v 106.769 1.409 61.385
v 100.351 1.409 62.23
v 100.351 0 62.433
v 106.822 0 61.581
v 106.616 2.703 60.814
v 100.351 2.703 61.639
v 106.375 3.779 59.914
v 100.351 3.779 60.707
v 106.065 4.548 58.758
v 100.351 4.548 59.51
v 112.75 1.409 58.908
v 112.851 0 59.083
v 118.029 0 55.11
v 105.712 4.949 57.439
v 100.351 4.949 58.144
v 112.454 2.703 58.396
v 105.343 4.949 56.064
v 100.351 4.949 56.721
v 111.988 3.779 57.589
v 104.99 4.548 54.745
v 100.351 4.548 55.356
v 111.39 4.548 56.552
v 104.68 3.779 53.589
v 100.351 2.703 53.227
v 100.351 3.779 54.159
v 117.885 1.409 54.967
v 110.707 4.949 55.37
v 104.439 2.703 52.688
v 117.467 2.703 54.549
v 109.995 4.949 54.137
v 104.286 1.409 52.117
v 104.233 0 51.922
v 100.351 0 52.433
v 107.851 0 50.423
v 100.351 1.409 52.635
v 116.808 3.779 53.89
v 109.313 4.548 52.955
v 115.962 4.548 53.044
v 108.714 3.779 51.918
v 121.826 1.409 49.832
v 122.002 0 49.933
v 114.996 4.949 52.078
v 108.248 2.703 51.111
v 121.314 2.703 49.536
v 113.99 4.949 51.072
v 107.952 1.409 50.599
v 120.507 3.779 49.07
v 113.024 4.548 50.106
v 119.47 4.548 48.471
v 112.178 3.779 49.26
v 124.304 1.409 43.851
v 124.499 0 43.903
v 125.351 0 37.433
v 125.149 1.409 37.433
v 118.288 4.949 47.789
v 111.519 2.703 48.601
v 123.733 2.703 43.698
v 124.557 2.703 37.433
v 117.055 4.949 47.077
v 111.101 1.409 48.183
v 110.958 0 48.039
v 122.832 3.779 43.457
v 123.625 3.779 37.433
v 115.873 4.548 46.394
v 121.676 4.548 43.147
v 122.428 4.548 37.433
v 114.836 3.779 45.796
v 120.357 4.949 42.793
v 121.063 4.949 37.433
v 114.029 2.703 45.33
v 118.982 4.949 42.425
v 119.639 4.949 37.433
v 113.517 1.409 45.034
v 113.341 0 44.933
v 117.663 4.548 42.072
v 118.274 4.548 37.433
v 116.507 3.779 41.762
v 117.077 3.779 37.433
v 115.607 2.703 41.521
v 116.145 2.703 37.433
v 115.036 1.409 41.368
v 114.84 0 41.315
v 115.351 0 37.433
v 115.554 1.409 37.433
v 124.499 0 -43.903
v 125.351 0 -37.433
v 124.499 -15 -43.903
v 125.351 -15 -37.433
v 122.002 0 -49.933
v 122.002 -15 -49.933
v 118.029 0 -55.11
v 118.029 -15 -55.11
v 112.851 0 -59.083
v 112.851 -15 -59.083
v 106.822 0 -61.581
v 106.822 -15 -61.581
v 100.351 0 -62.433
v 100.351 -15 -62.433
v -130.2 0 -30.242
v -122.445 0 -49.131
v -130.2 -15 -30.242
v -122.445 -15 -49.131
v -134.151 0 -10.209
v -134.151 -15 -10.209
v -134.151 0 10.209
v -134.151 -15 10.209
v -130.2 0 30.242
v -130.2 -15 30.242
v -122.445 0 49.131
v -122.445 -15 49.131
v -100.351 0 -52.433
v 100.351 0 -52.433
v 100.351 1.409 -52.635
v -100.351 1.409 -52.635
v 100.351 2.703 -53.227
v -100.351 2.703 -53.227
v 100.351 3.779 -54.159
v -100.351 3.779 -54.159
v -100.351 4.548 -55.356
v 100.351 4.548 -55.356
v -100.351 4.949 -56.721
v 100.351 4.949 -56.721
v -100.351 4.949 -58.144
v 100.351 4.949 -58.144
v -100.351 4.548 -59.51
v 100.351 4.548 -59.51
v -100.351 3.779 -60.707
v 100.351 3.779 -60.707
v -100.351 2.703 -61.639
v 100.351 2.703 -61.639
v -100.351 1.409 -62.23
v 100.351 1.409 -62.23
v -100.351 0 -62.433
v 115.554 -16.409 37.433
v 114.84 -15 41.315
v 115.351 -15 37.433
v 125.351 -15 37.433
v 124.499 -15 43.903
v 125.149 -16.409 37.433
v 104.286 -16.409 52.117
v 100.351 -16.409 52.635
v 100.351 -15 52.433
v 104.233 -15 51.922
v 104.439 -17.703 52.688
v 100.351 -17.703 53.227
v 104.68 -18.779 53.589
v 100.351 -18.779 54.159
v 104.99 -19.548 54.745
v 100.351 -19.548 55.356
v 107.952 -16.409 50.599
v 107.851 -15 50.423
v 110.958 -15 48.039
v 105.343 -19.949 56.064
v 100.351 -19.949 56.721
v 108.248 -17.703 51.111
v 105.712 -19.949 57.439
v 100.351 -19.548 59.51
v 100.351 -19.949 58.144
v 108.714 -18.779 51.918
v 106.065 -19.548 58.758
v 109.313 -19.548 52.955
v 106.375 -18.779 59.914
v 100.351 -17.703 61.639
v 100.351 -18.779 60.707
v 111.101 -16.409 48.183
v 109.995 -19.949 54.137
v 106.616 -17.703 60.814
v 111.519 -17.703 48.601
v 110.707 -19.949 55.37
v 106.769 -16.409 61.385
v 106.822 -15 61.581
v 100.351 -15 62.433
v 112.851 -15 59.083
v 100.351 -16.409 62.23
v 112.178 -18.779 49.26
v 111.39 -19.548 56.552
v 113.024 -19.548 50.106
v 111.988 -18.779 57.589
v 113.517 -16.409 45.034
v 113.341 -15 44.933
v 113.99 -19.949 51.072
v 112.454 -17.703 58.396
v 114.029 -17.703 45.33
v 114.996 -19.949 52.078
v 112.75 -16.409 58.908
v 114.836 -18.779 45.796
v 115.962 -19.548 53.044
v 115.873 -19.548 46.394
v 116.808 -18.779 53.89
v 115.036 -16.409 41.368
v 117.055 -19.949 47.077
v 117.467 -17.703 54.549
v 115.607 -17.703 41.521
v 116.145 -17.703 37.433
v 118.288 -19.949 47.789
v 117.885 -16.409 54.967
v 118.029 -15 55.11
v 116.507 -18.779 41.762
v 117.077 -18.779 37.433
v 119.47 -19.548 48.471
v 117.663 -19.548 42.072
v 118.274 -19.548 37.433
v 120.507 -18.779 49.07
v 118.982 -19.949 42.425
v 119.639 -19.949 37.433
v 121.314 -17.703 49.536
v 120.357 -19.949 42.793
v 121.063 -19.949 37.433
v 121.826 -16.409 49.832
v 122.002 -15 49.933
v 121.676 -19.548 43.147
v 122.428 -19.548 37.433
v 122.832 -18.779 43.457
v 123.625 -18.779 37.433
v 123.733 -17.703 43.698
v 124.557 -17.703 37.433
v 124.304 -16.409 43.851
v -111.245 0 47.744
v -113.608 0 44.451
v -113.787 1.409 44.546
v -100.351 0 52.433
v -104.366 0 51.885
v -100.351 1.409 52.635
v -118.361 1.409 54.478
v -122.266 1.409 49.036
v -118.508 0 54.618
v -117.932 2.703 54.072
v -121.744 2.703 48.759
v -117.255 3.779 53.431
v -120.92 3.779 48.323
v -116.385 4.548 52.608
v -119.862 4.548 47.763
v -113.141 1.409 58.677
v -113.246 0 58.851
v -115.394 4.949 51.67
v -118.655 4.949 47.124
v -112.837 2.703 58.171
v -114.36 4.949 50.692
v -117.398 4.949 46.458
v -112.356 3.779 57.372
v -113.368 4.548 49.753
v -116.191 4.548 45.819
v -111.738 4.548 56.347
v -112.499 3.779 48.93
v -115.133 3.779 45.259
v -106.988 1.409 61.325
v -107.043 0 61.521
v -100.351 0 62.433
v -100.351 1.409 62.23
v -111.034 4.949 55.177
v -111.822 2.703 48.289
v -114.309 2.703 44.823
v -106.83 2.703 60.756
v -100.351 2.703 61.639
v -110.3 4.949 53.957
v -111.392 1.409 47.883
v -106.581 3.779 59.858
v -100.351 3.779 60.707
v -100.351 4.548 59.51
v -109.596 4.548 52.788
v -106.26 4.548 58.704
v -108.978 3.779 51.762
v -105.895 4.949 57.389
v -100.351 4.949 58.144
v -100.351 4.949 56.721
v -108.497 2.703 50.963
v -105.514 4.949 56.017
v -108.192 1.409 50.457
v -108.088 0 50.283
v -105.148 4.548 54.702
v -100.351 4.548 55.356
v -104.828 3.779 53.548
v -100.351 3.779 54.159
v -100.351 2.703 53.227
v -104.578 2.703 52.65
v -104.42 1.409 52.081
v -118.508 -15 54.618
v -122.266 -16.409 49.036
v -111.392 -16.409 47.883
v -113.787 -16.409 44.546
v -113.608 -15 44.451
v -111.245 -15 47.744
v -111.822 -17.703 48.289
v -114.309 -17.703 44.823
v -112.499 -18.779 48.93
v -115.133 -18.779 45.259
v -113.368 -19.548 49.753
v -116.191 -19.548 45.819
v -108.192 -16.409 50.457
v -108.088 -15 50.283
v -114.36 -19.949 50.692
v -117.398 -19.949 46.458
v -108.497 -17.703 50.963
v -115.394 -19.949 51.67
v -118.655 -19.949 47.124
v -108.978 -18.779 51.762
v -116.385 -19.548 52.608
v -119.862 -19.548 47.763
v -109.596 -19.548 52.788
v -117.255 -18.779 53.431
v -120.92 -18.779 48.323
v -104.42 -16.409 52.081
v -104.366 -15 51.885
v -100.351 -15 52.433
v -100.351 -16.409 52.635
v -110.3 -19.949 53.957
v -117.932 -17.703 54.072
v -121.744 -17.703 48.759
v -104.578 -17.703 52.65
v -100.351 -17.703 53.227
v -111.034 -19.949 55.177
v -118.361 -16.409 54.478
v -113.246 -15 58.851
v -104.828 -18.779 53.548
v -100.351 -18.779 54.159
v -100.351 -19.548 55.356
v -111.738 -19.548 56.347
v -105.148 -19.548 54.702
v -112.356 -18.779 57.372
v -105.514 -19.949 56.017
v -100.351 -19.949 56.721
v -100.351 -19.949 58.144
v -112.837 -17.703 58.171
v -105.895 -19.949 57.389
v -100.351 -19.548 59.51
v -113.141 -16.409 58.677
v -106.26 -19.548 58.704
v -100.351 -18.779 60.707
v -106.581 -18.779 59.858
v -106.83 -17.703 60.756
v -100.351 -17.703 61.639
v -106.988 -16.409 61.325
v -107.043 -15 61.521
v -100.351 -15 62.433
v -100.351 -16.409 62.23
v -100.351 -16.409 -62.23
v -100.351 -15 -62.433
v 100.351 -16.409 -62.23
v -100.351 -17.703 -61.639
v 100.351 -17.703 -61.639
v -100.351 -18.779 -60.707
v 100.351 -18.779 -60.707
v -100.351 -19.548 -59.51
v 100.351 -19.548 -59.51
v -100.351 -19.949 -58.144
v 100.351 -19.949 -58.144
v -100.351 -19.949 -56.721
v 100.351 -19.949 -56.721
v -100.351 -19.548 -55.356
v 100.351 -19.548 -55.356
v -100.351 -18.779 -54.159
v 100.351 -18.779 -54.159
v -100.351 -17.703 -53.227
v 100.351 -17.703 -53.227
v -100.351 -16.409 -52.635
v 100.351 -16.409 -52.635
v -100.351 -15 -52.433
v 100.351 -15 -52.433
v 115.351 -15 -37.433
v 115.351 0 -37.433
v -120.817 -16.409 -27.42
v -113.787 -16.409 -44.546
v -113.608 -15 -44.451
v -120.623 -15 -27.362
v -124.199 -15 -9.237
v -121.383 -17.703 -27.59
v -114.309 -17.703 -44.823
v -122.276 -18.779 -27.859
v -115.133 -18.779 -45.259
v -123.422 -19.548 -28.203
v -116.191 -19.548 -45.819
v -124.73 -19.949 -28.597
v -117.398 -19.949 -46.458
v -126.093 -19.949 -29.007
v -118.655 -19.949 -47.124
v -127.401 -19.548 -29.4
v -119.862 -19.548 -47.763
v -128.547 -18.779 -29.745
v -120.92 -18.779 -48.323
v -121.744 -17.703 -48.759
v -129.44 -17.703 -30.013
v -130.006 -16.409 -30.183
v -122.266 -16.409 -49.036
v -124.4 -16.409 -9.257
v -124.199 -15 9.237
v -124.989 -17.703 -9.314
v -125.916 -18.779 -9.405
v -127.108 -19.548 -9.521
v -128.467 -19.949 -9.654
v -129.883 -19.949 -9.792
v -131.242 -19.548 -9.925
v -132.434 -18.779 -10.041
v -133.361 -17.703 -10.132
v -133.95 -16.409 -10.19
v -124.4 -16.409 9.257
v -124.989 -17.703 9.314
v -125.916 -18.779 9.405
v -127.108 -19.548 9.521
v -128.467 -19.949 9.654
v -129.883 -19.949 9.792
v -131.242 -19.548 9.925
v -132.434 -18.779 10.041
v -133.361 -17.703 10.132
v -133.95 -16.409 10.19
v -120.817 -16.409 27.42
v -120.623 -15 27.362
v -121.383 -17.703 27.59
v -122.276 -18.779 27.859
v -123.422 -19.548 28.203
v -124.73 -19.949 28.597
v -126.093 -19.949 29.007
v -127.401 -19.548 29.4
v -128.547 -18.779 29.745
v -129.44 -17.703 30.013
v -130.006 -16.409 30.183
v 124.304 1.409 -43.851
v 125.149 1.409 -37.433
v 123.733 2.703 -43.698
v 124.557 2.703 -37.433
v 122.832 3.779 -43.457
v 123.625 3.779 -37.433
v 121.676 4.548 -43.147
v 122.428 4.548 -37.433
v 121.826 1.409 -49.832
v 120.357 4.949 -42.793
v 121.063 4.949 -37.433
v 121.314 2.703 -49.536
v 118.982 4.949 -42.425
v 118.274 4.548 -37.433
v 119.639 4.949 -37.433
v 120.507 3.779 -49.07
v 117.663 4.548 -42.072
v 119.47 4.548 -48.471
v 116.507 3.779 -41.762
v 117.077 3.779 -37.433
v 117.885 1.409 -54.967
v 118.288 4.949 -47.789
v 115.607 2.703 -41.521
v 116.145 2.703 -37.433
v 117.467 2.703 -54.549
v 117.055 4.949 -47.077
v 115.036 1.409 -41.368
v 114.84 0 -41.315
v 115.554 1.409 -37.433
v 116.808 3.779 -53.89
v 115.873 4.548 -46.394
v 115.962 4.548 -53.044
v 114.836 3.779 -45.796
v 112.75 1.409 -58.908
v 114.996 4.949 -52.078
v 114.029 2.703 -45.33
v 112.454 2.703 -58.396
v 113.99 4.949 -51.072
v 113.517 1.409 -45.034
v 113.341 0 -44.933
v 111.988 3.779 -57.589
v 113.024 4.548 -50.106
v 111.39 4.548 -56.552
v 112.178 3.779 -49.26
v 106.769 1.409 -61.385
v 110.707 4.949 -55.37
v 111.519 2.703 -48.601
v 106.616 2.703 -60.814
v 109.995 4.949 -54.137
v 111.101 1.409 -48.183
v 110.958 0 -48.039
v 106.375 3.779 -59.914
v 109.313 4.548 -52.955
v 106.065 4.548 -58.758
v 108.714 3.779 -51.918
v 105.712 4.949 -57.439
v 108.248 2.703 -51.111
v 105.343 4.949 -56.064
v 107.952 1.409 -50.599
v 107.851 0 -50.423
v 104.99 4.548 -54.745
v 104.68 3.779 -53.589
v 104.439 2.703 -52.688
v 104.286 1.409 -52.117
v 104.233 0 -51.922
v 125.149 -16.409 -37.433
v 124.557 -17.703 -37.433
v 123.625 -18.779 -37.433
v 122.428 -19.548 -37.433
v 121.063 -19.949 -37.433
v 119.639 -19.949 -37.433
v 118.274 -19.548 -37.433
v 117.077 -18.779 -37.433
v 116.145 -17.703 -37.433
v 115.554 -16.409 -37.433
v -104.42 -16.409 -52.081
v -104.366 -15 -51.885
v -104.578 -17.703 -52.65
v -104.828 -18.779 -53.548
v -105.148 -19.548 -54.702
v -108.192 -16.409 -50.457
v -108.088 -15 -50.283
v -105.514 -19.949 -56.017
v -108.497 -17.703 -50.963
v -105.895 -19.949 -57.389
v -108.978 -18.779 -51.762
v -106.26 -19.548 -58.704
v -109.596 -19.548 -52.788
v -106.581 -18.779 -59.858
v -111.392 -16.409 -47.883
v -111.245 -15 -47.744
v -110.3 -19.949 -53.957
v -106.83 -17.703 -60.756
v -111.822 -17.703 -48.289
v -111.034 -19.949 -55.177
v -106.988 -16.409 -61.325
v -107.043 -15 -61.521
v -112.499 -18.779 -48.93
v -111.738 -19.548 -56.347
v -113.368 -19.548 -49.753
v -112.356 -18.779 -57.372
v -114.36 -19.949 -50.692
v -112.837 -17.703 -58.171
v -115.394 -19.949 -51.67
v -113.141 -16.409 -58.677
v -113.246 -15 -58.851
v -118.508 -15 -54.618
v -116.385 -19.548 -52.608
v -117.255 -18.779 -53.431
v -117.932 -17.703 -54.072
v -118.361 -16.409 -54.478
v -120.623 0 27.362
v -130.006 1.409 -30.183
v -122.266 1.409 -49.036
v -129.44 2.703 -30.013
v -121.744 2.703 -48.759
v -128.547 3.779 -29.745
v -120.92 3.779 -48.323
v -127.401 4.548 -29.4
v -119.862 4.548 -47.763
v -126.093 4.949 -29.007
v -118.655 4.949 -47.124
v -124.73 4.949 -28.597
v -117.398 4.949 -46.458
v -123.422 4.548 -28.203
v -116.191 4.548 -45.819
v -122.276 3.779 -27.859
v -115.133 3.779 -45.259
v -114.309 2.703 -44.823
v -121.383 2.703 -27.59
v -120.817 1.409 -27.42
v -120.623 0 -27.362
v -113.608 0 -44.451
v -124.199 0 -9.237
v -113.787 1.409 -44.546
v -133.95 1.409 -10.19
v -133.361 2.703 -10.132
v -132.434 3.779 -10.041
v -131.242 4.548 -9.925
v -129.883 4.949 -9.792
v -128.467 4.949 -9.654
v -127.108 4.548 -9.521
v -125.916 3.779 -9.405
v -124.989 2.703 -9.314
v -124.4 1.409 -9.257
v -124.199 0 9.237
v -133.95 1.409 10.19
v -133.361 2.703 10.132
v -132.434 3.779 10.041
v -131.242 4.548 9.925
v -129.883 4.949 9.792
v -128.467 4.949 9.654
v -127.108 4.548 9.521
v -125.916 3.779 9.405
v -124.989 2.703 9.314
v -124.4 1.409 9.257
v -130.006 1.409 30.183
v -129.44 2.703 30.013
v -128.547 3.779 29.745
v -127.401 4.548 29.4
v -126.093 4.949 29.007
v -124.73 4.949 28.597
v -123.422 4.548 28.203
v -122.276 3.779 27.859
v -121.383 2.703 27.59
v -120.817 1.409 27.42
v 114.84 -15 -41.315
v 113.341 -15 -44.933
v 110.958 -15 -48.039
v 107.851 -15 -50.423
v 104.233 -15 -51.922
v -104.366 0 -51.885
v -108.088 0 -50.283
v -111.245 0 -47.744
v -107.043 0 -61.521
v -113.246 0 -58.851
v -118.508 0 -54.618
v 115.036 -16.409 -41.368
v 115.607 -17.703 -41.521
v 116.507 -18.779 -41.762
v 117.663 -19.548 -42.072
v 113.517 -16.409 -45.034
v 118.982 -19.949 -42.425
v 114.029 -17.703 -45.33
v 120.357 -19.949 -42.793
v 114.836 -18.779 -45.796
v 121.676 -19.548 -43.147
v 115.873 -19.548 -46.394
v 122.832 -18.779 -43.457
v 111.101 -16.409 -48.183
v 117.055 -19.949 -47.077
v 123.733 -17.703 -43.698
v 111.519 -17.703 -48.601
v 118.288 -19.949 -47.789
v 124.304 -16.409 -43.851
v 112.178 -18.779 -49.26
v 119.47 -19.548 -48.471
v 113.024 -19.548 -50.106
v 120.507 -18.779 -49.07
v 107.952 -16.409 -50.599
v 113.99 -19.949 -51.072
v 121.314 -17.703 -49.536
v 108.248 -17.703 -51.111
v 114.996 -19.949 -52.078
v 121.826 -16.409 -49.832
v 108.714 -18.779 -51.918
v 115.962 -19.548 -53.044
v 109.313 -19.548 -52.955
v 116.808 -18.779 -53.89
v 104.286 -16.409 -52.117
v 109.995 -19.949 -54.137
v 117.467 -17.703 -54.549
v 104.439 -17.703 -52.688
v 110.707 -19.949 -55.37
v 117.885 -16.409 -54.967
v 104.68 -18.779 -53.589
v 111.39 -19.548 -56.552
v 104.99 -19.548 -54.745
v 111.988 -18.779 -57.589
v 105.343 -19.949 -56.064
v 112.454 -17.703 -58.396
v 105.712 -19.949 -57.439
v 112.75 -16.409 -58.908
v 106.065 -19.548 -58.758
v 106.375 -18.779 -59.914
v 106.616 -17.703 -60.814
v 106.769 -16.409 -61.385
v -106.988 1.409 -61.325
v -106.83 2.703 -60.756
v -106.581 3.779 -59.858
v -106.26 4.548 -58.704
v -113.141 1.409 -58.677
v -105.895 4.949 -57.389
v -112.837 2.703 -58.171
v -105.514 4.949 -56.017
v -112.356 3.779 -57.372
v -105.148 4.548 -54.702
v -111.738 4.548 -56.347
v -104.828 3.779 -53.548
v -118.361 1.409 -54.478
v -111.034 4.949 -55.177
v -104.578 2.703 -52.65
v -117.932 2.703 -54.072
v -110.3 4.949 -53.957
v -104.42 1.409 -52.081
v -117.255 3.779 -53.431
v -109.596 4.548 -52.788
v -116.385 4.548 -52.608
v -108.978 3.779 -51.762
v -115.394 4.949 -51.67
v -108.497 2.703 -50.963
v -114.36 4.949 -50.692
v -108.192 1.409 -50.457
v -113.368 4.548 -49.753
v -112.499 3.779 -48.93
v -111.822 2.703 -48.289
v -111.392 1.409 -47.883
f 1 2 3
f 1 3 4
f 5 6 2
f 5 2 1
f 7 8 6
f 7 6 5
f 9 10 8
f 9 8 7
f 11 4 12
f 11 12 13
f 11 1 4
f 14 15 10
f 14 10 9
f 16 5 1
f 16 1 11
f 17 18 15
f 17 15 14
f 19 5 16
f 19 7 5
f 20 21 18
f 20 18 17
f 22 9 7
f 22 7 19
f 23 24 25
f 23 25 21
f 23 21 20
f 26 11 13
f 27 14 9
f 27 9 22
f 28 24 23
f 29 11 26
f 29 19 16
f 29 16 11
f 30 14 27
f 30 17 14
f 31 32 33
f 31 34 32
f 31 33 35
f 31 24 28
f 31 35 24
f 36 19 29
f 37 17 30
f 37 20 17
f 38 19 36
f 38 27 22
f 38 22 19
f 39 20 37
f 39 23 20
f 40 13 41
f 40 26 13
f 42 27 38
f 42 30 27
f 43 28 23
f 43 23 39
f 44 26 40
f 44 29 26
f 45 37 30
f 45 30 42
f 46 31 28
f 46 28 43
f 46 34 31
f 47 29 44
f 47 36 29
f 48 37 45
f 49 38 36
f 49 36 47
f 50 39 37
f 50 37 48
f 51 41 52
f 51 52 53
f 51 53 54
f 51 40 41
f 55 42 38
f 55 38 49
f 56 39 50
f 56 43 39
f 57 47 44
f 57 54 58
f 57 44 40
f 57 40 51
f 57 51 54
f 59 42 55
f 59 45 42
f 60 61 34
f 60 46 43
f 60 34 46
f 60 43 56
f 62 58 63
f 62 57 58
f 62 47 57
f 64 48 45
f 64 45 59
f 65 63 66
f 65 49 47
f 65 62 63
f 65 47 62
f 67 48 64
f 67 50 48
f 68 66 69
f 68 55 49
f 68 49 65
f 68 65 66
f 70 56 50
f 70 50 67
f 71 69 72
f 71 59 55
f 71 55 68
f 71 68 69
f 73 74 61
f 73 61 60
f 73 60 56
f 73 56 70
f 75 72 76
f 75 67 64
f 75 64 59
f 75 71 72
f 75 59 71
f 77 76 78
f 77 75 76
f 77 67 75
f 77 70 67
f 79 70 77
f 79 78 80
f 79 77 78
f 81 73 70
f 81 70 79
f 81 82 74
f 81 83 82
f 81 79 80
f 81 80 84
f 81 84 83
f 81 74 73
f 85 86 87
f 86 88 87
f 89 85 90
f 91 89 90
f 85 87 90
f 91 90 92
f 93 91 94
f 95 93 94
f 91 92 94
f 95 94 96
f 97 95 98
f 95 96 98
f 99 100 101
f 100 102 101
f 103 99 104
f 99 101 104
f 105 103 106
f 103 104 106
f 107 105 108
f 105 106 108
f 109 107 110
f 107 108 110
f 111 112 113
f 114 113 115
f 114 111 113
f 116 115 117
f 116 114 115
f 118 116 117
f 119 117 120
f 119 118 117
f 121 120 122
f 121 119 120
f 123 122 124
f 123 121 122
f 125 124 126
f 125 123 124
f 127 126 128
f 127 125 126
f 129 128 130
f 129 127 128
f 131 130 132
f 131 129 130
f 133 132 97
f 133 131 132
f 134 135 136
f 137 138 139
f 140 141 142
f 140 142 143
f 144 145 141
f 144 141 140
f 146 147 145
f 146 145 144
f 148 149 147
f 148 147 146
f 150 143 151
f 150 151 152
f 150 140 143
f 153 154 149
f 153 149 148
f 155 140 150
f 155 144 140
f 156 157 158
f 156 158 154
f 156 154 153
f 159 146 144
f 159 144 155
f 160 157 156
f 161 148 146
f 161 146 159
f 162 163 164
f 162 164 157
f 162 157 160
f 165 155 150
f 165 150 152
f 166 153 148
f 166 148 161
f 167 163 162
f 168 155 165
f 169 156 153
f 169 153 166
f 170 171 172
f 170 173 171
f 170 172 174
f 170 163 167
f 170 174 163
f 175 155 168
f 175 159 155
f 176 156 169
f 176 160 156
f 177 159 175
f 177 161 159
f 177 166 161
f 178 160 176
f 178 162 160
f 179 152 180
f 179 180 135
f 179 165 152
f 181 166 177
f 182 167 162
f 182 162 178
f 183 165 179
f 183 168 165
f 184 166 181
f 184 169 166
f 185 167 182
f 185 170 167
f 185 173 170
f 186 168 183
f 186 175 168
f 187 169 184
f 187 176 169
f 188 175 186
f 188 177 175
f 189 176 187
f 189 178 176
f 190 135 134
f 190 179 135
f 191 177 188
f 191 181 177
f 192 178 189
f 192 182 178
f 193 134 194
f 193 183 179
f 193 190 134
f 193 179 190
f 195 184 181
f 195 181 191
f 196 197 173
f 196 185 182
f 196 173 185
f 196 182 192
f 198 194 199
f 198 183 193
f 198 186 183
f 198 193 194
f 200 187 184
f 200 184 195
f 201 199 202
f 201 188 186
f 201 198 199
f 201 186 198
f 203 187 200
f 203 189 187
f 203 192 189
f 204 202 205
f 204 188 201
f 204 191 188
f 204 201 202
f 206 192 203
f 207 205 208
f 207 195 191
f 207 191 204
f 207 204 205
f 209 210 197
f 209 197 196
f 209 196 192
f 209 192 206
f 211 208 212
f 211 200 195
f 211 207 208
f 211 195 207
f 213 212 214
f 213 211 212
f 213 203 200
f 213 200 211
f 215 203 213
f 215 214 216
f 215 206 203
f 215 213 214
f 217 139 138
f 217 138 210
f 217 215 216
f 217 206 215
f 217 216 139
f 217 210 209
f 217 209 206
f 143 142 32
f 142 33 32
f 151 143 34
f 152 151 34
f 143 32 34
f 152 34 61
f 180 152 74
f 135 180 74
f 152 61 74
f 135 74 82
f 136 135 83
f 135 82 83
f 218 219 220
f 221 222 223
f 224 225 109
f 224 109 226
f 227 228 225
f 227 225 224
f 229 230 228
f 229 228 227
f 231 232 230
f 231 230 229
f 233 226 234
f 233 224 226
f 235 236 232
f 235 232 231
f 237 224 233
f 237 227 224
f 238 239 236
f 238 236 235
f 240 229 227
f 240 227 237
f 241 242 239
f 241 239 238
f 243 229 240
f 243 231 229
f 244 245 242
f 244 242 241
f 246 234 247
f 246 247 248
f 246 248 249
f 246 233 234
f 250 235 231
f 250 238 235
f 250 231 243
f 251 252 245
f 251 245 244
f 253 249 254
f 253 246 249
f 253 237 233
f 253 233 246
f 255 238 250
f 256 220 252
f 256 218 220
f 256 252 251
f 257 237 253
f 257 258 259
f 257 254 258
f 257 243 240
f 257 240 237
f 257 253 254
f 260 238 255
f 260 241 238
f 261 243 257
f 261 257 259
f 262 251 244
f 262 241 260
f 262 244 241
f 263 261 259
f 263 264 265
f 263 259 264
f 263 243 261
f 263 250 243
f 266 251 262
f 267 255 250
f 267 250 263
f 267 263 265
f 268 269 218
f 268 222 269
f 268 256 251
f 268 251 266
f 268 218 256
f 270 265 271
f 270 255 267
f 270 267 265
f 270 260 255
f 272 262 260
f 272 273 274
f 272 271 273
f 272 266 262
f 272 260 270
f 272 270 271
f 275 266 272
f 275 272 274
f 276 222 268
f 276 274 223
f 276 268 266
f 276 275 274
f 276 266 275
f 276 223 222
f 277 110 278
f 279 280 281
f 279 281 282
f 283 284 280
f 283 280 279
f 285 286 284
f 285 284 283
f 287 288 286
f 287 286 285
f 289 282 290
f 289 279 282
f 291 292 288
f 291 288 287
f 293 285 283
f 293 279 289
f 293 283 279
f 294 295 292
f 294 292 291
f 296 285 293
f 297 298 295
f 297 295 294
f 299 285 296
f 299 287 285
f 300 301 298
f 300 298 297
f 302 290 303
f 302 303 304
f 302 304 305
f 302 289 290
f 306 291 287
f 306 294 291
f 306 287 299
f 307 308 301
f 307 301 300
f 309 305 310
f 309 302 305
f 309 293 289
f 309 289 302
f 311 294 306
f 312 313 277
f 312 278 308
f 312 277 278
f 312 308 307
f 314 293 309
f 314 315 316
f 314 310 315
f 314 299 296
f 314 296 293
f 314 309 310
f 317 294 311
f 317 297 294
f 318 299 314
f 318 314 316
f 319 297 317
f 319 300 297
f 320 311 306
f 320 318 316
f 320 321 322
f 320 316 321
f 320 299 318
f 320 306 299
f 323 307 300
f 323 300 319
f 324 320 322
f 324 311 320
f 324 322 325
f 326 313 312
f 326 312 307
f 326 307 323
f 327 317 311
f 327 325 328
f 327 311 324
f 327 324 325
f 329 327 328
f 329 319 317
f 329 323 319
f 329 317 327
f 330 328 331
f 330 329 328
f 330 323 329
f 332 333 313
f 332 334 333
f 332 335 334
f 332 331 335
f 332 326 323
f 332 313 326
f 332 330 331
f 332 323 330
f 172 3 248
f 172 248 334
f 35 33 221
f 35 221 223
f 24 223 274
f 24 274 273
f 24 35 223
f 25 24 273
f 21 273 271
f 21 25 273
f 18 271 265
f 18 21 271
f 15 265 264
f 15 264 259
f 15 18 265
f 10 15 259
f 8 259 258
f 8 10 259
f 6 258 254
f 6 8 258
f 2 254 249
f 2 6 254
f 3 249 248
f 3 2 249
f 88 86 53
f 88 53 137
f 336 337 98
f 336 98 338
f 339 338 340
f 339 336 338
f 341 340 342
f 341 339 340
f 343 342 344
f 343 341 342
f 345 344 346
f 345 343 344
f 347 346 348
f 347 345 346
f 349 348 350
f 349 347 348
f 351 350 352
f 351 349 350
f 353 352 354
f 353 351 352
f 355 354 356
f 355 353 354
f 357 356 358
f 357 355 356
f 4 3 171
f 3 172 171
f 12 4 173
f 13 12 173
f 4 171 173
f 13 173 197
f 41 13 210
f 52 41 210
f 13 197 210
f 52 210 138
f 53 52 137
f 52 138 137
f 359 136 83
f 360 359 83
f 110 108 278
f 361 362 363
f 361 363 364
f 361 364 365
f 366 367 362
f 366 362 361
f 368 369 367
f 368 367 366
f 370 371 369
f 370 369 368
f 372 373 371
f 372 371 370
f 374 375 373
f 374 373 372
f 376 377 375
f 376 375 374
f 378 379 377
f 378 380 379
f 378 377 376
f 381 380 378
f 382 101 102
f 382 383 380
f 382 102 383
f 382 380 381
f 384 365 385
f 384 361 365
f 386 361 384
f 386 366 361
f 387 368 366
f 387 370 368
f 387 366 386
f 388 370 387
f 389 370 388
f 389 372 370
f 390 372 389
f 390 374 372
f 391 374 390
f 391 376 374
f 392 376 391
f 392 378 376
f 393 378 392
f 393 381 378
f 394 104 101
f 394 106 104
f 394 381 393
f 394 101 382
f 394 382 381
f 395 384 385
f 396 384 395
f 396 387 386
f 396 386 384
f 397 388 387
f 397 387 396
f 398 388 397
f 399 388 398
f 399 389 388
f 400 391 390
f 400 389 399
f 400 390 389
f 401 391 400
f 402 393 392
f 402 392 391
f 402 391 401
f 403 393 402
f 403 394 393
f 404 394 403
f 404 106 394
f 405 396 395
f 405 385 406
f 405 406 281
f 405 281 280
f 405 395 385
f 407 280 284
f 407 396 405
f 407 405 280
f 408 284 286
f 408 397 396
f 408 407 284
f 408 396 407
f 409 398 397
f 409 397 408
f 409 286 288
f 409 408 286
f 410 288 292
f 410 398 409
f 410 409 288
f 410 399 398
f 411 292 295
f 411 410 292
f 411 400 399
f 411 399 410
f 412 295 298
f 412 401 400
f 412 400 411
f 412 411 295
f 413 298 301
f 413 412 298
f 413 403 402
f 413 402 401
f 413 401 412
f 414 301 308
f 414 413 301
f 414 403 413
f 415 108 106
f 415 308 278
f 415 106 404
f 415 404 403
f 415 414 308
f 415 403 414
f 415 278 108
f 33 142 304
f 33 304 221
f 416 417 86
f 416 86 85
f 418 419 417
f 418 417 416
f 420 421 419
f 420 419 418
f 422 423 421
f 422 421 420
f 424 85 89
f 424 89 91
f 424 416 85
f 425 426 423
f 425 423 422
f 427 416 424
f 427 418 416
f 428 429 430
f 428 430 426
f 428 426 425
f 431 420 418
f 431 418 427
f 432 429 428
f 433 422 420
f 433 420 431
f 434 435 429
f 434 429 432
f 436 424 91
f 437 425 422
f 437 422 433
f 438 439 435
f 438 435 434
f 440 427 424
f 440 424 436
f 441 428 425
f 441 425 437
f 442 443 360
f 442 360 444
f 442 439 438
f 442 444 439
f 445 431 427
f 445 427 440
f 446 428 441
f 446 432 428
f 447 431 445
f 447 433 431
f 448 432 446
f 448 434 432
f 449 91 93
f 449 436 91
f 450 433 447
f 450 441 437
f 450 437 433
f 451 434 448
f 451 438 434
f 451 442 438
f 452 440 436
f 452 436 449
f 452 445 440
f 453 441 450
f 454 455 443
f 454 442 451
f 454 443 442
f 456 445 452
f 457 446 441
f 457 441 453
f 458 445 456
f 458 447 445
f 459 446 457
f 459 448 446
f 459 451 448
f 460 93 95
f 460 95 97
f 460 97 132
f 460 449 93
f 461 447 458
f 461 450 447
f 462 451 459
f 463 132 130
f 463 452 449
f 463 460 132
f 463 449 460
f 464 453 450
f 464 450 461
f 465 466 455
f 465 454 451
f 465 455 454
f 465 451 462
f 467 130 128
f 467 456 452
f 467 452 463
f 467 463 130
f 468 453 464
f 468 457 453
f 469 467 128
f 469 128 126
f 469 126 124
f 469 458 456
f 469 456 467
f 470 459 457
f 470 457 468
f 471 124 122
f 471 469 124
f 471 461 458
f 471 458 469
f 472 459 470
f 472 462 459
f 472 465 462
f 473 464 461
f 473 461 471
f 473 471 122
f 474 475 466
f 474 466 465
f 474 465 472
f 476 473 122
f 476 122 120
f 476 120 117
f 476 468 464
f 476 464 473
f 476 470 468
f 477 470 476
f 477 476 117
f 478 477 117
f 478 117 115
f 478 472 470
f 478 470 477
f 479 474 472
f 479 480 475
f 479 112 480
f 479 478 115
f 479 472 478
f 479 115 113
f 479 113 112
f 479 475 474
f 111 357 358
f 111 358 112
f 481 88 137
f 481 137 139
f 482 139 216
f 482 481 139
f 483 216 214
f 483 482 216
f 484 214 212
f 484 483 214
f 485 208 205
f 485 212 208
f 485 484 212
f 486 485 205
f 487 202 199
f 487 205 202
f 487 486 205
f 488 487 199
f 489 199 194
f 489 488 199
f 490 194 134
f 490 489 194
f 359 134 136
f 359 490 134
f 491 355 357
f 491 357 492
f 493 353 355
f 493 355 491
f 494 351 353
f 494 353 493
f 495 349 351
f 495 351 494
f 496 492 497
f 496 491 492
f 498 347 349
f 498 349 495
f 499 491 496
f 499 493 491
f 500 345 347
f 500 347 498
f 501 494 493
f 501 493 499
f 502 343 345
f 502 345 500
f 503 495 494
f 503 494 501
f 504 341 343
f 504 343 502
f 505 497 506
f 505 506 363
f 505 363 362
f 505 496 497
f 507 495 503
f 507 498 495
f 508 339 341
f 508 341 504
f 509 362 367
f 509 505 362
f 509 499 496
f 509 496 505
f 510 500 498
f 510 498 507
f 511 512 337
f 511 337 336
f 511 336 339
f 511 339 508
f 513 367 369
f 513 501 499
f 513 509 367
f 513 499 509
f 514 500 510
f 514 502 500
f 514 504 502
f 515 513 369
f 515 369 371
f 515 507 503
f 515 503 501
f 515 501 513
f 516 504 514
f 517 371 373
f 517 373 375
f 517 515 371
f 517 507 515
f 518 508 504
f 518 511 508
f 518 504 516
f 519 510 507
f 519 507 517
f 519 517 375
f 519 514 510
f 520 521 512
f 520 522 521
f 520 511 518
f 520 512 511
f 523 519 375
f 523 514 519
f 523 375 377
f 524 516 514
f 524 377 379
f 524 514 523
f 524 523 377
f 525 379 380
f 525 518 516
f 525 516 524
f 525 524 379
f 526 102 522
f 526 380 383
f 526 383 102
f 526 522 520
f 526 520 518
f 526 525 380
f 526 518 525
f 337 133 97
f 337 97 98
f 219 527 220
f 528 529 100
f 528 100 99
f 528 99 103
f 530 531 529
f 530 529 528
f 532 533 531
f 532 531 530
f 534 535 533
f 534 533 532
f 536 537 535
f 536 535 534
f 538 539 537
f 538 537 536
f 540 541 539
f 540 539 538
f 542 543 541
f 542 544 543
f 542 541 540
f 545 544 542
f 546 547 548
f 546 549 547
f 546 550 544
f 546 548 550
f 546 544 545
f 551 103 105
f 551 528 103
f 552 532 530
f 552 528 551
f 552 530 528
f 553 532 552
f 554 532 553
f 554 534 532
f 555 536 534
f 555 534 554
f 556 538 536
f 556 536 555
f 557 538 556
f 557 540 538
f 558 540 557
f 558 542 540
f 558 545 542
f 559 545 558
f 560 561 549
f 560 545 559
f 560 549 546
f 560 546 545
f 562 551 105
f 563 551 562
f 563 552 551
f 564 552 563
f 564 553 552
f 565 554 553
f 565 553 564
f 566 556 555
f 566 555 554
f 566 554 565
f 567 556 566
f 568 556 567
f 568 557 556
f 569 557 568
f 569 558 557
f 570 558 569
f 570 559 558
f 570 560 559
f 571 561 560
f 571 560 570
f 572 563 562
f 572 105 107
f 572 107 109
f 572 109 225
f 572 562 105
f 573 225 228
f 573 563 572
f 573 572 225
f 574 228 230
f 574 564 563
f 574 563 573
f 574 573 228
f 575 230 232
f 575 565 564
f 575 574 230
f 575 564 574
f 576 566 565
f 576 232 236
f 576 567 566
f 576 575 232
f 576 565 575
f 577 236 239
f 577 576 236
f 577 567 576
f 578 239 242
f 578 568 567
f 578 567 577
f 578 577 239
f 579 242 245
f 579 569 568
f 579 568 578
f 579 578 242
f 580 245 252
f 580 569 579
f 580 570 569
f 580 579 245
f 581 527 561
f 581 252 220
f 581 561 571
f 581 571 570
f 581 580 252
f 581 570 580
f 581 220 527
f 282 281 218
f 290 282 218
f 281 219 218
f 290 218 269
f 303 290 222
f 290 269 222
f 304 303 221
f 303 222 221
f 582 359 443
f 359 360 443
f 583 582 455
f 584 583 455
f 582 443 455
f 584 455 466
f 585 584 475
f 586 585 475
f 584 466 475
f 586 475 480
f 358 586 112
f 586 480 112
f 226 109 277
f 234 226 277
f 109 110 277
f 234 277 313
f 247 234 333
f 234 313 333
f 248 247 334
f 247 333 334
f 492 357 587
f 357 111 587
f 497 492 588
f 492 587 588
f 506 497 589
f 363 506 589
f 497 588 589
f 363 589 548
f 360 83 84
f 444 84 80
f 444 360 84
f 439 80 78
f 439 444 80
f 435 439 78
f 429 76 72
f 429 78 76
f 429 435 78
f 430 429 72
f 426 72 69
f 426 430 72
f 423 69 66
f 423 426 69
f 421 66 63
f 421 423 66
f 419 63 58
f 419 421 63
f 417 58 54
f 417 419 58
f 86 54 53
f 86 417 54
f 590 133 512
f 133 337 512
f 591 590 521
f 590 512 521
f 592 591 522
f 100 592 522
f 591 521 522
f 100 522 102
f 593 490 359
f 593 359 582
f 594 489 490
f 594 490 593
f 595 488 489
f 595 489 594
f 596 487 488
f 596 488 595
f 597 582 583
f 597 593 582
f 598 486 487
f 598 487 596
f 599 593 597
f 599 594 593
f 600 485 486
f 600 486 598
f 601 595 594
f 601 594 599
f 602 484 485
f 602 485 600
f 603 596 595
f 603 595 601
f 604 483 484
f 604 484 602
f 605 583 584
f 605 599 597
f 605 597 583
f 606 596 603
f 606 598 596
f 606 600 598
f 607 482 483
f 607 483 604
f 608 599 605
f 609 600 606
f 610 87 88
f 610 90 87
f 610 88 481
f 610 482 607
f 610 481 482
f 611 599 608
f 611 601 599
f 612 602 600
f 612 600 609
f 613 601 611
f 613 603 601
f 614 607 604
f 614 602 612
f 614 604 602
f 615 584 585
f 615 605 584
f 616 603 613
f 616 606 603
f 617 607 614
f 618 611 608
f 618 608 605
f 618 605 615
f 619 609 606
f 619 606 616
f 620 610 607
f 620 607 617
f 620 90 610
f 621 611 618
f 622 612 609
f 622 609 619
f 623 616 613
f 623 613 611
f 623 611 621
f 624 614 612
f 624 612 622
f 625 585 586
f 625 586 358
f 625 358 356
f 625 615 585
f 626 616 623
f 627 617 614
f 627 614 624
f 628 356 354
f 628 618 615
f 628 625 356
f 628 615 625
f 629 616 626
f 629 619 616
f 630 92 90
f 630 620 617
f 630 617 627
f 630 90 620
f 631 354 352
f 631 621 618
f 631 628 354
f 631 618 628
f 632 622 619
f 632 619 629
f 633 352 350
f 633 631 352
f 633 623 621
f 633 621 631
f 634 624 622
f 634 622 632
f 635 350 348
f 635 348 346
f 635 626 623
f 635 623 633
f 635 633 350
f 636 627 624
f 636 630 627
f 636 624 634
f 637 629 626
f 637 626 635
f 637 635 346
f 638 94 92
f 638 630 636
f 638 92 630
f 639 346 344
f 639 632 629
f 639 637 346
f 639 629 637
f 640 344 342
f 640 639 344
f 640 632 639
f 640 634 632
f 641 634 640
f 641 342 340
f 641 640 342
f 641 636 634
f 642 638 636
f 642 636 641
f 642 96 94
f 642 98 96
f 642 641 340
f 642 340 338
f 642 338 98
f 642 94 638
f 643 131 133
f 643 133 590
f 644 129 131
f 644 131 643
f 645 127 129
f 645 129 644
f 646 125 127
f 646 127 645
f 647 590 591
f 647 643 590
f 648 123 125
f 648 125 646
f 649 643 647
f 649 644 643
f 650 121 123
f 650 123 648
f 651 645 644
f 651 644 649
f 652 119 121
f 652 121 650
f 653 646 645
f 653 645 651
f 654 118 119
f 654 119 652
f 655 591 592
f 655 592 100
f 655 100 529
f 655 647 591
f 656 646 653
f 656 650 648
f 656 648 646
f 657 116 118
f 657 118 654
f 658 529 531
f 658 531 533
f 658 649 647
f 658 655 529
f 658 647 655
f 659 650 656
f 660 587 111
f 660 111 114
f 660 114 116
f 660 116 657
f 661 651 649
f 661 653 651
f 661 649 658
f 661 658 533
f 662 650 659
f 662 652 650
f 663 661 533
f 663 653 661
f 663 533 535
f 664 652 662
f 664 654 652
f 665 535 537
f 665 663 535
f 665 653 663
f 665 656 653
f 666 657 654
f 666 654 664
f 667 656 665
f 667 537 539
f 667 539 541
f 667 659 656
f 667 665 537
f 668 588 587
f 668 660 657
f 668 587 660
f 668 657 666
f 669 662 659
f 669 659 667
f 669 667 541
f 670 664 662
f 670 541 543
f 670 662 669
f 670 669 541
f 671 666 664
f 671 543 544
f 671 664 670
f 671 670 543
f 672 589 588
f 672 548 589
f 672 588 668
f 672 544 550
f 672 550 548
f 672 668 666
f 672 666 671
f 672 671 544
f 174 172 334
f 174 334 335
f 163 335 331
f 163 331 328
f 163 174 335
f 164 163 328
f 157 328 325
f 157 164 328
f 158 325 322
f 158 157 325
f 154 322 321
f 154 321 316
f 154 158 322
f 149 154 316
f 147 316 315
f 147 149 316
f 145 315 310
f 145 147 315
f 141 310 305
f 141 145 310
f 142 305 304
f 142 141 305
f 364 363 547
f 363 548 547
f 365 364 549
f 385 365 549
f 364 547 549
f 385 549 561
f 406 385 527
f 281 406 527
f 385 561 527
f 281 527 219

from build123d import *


with BuildPart() as part:
    # Austragung1: sweep along a path in Skizze1
    with BuildLine(Plane(origin=(0, 0, 0), x_dir=(1, 0, 0), z_dir=(0, 1, 0))) as austragung1_path:
        Line((-100.35104183, -57.432811357), (100.35104183, -57.432811357))
        ThreePointArc((100.35104183, -57.432811357), (114.493177454, -51.574946981), (120.35104183, -37.432811357))
        Line((120.35104183, -37.432811357), (120.35104183, 37.432811357))
        ThreePointArc((120.35104183, 37.432811357), (114.493177454, 51.574946981), (100.35104183, 57.432811357))
        Line((100.35104183, 57.432811357), (-100.35104183, 57.432811357))
        ThreePointArc((-100.35104183, 57.432811357), (-110.666950496, 54.567046922), (-118.026562745, 46.791014197))
        ThreePointArc((-118.026562745, 46.791014197), (-129.64895817, 0), (-118.026562745, -46.791014197))
        ThreePointArc((-118.026562745, -46.791014197), (-110.666950496, -54.567046922), (-100.35104183, -57.432811357))
    # Skizze2 → Austragung1 (sweep)
    with BuildSketch(Plane.XY):
        with BuildLine():
            Line((-124.64895817, 0), (-124.64895817, -15))
            ThreePointArc((-124.64895817, -15), (-129.64895817, -20), (-134.64895817, -15))
            Line((-134.64895817, -15), (-134.64895817, 0))
            ThreePointArc((-134.64895817, 0), (-129.64895817, 5), (-124.64895817, 0))
        make_face()
    sweep(path=austragung1_path.line)


solid = part.part
